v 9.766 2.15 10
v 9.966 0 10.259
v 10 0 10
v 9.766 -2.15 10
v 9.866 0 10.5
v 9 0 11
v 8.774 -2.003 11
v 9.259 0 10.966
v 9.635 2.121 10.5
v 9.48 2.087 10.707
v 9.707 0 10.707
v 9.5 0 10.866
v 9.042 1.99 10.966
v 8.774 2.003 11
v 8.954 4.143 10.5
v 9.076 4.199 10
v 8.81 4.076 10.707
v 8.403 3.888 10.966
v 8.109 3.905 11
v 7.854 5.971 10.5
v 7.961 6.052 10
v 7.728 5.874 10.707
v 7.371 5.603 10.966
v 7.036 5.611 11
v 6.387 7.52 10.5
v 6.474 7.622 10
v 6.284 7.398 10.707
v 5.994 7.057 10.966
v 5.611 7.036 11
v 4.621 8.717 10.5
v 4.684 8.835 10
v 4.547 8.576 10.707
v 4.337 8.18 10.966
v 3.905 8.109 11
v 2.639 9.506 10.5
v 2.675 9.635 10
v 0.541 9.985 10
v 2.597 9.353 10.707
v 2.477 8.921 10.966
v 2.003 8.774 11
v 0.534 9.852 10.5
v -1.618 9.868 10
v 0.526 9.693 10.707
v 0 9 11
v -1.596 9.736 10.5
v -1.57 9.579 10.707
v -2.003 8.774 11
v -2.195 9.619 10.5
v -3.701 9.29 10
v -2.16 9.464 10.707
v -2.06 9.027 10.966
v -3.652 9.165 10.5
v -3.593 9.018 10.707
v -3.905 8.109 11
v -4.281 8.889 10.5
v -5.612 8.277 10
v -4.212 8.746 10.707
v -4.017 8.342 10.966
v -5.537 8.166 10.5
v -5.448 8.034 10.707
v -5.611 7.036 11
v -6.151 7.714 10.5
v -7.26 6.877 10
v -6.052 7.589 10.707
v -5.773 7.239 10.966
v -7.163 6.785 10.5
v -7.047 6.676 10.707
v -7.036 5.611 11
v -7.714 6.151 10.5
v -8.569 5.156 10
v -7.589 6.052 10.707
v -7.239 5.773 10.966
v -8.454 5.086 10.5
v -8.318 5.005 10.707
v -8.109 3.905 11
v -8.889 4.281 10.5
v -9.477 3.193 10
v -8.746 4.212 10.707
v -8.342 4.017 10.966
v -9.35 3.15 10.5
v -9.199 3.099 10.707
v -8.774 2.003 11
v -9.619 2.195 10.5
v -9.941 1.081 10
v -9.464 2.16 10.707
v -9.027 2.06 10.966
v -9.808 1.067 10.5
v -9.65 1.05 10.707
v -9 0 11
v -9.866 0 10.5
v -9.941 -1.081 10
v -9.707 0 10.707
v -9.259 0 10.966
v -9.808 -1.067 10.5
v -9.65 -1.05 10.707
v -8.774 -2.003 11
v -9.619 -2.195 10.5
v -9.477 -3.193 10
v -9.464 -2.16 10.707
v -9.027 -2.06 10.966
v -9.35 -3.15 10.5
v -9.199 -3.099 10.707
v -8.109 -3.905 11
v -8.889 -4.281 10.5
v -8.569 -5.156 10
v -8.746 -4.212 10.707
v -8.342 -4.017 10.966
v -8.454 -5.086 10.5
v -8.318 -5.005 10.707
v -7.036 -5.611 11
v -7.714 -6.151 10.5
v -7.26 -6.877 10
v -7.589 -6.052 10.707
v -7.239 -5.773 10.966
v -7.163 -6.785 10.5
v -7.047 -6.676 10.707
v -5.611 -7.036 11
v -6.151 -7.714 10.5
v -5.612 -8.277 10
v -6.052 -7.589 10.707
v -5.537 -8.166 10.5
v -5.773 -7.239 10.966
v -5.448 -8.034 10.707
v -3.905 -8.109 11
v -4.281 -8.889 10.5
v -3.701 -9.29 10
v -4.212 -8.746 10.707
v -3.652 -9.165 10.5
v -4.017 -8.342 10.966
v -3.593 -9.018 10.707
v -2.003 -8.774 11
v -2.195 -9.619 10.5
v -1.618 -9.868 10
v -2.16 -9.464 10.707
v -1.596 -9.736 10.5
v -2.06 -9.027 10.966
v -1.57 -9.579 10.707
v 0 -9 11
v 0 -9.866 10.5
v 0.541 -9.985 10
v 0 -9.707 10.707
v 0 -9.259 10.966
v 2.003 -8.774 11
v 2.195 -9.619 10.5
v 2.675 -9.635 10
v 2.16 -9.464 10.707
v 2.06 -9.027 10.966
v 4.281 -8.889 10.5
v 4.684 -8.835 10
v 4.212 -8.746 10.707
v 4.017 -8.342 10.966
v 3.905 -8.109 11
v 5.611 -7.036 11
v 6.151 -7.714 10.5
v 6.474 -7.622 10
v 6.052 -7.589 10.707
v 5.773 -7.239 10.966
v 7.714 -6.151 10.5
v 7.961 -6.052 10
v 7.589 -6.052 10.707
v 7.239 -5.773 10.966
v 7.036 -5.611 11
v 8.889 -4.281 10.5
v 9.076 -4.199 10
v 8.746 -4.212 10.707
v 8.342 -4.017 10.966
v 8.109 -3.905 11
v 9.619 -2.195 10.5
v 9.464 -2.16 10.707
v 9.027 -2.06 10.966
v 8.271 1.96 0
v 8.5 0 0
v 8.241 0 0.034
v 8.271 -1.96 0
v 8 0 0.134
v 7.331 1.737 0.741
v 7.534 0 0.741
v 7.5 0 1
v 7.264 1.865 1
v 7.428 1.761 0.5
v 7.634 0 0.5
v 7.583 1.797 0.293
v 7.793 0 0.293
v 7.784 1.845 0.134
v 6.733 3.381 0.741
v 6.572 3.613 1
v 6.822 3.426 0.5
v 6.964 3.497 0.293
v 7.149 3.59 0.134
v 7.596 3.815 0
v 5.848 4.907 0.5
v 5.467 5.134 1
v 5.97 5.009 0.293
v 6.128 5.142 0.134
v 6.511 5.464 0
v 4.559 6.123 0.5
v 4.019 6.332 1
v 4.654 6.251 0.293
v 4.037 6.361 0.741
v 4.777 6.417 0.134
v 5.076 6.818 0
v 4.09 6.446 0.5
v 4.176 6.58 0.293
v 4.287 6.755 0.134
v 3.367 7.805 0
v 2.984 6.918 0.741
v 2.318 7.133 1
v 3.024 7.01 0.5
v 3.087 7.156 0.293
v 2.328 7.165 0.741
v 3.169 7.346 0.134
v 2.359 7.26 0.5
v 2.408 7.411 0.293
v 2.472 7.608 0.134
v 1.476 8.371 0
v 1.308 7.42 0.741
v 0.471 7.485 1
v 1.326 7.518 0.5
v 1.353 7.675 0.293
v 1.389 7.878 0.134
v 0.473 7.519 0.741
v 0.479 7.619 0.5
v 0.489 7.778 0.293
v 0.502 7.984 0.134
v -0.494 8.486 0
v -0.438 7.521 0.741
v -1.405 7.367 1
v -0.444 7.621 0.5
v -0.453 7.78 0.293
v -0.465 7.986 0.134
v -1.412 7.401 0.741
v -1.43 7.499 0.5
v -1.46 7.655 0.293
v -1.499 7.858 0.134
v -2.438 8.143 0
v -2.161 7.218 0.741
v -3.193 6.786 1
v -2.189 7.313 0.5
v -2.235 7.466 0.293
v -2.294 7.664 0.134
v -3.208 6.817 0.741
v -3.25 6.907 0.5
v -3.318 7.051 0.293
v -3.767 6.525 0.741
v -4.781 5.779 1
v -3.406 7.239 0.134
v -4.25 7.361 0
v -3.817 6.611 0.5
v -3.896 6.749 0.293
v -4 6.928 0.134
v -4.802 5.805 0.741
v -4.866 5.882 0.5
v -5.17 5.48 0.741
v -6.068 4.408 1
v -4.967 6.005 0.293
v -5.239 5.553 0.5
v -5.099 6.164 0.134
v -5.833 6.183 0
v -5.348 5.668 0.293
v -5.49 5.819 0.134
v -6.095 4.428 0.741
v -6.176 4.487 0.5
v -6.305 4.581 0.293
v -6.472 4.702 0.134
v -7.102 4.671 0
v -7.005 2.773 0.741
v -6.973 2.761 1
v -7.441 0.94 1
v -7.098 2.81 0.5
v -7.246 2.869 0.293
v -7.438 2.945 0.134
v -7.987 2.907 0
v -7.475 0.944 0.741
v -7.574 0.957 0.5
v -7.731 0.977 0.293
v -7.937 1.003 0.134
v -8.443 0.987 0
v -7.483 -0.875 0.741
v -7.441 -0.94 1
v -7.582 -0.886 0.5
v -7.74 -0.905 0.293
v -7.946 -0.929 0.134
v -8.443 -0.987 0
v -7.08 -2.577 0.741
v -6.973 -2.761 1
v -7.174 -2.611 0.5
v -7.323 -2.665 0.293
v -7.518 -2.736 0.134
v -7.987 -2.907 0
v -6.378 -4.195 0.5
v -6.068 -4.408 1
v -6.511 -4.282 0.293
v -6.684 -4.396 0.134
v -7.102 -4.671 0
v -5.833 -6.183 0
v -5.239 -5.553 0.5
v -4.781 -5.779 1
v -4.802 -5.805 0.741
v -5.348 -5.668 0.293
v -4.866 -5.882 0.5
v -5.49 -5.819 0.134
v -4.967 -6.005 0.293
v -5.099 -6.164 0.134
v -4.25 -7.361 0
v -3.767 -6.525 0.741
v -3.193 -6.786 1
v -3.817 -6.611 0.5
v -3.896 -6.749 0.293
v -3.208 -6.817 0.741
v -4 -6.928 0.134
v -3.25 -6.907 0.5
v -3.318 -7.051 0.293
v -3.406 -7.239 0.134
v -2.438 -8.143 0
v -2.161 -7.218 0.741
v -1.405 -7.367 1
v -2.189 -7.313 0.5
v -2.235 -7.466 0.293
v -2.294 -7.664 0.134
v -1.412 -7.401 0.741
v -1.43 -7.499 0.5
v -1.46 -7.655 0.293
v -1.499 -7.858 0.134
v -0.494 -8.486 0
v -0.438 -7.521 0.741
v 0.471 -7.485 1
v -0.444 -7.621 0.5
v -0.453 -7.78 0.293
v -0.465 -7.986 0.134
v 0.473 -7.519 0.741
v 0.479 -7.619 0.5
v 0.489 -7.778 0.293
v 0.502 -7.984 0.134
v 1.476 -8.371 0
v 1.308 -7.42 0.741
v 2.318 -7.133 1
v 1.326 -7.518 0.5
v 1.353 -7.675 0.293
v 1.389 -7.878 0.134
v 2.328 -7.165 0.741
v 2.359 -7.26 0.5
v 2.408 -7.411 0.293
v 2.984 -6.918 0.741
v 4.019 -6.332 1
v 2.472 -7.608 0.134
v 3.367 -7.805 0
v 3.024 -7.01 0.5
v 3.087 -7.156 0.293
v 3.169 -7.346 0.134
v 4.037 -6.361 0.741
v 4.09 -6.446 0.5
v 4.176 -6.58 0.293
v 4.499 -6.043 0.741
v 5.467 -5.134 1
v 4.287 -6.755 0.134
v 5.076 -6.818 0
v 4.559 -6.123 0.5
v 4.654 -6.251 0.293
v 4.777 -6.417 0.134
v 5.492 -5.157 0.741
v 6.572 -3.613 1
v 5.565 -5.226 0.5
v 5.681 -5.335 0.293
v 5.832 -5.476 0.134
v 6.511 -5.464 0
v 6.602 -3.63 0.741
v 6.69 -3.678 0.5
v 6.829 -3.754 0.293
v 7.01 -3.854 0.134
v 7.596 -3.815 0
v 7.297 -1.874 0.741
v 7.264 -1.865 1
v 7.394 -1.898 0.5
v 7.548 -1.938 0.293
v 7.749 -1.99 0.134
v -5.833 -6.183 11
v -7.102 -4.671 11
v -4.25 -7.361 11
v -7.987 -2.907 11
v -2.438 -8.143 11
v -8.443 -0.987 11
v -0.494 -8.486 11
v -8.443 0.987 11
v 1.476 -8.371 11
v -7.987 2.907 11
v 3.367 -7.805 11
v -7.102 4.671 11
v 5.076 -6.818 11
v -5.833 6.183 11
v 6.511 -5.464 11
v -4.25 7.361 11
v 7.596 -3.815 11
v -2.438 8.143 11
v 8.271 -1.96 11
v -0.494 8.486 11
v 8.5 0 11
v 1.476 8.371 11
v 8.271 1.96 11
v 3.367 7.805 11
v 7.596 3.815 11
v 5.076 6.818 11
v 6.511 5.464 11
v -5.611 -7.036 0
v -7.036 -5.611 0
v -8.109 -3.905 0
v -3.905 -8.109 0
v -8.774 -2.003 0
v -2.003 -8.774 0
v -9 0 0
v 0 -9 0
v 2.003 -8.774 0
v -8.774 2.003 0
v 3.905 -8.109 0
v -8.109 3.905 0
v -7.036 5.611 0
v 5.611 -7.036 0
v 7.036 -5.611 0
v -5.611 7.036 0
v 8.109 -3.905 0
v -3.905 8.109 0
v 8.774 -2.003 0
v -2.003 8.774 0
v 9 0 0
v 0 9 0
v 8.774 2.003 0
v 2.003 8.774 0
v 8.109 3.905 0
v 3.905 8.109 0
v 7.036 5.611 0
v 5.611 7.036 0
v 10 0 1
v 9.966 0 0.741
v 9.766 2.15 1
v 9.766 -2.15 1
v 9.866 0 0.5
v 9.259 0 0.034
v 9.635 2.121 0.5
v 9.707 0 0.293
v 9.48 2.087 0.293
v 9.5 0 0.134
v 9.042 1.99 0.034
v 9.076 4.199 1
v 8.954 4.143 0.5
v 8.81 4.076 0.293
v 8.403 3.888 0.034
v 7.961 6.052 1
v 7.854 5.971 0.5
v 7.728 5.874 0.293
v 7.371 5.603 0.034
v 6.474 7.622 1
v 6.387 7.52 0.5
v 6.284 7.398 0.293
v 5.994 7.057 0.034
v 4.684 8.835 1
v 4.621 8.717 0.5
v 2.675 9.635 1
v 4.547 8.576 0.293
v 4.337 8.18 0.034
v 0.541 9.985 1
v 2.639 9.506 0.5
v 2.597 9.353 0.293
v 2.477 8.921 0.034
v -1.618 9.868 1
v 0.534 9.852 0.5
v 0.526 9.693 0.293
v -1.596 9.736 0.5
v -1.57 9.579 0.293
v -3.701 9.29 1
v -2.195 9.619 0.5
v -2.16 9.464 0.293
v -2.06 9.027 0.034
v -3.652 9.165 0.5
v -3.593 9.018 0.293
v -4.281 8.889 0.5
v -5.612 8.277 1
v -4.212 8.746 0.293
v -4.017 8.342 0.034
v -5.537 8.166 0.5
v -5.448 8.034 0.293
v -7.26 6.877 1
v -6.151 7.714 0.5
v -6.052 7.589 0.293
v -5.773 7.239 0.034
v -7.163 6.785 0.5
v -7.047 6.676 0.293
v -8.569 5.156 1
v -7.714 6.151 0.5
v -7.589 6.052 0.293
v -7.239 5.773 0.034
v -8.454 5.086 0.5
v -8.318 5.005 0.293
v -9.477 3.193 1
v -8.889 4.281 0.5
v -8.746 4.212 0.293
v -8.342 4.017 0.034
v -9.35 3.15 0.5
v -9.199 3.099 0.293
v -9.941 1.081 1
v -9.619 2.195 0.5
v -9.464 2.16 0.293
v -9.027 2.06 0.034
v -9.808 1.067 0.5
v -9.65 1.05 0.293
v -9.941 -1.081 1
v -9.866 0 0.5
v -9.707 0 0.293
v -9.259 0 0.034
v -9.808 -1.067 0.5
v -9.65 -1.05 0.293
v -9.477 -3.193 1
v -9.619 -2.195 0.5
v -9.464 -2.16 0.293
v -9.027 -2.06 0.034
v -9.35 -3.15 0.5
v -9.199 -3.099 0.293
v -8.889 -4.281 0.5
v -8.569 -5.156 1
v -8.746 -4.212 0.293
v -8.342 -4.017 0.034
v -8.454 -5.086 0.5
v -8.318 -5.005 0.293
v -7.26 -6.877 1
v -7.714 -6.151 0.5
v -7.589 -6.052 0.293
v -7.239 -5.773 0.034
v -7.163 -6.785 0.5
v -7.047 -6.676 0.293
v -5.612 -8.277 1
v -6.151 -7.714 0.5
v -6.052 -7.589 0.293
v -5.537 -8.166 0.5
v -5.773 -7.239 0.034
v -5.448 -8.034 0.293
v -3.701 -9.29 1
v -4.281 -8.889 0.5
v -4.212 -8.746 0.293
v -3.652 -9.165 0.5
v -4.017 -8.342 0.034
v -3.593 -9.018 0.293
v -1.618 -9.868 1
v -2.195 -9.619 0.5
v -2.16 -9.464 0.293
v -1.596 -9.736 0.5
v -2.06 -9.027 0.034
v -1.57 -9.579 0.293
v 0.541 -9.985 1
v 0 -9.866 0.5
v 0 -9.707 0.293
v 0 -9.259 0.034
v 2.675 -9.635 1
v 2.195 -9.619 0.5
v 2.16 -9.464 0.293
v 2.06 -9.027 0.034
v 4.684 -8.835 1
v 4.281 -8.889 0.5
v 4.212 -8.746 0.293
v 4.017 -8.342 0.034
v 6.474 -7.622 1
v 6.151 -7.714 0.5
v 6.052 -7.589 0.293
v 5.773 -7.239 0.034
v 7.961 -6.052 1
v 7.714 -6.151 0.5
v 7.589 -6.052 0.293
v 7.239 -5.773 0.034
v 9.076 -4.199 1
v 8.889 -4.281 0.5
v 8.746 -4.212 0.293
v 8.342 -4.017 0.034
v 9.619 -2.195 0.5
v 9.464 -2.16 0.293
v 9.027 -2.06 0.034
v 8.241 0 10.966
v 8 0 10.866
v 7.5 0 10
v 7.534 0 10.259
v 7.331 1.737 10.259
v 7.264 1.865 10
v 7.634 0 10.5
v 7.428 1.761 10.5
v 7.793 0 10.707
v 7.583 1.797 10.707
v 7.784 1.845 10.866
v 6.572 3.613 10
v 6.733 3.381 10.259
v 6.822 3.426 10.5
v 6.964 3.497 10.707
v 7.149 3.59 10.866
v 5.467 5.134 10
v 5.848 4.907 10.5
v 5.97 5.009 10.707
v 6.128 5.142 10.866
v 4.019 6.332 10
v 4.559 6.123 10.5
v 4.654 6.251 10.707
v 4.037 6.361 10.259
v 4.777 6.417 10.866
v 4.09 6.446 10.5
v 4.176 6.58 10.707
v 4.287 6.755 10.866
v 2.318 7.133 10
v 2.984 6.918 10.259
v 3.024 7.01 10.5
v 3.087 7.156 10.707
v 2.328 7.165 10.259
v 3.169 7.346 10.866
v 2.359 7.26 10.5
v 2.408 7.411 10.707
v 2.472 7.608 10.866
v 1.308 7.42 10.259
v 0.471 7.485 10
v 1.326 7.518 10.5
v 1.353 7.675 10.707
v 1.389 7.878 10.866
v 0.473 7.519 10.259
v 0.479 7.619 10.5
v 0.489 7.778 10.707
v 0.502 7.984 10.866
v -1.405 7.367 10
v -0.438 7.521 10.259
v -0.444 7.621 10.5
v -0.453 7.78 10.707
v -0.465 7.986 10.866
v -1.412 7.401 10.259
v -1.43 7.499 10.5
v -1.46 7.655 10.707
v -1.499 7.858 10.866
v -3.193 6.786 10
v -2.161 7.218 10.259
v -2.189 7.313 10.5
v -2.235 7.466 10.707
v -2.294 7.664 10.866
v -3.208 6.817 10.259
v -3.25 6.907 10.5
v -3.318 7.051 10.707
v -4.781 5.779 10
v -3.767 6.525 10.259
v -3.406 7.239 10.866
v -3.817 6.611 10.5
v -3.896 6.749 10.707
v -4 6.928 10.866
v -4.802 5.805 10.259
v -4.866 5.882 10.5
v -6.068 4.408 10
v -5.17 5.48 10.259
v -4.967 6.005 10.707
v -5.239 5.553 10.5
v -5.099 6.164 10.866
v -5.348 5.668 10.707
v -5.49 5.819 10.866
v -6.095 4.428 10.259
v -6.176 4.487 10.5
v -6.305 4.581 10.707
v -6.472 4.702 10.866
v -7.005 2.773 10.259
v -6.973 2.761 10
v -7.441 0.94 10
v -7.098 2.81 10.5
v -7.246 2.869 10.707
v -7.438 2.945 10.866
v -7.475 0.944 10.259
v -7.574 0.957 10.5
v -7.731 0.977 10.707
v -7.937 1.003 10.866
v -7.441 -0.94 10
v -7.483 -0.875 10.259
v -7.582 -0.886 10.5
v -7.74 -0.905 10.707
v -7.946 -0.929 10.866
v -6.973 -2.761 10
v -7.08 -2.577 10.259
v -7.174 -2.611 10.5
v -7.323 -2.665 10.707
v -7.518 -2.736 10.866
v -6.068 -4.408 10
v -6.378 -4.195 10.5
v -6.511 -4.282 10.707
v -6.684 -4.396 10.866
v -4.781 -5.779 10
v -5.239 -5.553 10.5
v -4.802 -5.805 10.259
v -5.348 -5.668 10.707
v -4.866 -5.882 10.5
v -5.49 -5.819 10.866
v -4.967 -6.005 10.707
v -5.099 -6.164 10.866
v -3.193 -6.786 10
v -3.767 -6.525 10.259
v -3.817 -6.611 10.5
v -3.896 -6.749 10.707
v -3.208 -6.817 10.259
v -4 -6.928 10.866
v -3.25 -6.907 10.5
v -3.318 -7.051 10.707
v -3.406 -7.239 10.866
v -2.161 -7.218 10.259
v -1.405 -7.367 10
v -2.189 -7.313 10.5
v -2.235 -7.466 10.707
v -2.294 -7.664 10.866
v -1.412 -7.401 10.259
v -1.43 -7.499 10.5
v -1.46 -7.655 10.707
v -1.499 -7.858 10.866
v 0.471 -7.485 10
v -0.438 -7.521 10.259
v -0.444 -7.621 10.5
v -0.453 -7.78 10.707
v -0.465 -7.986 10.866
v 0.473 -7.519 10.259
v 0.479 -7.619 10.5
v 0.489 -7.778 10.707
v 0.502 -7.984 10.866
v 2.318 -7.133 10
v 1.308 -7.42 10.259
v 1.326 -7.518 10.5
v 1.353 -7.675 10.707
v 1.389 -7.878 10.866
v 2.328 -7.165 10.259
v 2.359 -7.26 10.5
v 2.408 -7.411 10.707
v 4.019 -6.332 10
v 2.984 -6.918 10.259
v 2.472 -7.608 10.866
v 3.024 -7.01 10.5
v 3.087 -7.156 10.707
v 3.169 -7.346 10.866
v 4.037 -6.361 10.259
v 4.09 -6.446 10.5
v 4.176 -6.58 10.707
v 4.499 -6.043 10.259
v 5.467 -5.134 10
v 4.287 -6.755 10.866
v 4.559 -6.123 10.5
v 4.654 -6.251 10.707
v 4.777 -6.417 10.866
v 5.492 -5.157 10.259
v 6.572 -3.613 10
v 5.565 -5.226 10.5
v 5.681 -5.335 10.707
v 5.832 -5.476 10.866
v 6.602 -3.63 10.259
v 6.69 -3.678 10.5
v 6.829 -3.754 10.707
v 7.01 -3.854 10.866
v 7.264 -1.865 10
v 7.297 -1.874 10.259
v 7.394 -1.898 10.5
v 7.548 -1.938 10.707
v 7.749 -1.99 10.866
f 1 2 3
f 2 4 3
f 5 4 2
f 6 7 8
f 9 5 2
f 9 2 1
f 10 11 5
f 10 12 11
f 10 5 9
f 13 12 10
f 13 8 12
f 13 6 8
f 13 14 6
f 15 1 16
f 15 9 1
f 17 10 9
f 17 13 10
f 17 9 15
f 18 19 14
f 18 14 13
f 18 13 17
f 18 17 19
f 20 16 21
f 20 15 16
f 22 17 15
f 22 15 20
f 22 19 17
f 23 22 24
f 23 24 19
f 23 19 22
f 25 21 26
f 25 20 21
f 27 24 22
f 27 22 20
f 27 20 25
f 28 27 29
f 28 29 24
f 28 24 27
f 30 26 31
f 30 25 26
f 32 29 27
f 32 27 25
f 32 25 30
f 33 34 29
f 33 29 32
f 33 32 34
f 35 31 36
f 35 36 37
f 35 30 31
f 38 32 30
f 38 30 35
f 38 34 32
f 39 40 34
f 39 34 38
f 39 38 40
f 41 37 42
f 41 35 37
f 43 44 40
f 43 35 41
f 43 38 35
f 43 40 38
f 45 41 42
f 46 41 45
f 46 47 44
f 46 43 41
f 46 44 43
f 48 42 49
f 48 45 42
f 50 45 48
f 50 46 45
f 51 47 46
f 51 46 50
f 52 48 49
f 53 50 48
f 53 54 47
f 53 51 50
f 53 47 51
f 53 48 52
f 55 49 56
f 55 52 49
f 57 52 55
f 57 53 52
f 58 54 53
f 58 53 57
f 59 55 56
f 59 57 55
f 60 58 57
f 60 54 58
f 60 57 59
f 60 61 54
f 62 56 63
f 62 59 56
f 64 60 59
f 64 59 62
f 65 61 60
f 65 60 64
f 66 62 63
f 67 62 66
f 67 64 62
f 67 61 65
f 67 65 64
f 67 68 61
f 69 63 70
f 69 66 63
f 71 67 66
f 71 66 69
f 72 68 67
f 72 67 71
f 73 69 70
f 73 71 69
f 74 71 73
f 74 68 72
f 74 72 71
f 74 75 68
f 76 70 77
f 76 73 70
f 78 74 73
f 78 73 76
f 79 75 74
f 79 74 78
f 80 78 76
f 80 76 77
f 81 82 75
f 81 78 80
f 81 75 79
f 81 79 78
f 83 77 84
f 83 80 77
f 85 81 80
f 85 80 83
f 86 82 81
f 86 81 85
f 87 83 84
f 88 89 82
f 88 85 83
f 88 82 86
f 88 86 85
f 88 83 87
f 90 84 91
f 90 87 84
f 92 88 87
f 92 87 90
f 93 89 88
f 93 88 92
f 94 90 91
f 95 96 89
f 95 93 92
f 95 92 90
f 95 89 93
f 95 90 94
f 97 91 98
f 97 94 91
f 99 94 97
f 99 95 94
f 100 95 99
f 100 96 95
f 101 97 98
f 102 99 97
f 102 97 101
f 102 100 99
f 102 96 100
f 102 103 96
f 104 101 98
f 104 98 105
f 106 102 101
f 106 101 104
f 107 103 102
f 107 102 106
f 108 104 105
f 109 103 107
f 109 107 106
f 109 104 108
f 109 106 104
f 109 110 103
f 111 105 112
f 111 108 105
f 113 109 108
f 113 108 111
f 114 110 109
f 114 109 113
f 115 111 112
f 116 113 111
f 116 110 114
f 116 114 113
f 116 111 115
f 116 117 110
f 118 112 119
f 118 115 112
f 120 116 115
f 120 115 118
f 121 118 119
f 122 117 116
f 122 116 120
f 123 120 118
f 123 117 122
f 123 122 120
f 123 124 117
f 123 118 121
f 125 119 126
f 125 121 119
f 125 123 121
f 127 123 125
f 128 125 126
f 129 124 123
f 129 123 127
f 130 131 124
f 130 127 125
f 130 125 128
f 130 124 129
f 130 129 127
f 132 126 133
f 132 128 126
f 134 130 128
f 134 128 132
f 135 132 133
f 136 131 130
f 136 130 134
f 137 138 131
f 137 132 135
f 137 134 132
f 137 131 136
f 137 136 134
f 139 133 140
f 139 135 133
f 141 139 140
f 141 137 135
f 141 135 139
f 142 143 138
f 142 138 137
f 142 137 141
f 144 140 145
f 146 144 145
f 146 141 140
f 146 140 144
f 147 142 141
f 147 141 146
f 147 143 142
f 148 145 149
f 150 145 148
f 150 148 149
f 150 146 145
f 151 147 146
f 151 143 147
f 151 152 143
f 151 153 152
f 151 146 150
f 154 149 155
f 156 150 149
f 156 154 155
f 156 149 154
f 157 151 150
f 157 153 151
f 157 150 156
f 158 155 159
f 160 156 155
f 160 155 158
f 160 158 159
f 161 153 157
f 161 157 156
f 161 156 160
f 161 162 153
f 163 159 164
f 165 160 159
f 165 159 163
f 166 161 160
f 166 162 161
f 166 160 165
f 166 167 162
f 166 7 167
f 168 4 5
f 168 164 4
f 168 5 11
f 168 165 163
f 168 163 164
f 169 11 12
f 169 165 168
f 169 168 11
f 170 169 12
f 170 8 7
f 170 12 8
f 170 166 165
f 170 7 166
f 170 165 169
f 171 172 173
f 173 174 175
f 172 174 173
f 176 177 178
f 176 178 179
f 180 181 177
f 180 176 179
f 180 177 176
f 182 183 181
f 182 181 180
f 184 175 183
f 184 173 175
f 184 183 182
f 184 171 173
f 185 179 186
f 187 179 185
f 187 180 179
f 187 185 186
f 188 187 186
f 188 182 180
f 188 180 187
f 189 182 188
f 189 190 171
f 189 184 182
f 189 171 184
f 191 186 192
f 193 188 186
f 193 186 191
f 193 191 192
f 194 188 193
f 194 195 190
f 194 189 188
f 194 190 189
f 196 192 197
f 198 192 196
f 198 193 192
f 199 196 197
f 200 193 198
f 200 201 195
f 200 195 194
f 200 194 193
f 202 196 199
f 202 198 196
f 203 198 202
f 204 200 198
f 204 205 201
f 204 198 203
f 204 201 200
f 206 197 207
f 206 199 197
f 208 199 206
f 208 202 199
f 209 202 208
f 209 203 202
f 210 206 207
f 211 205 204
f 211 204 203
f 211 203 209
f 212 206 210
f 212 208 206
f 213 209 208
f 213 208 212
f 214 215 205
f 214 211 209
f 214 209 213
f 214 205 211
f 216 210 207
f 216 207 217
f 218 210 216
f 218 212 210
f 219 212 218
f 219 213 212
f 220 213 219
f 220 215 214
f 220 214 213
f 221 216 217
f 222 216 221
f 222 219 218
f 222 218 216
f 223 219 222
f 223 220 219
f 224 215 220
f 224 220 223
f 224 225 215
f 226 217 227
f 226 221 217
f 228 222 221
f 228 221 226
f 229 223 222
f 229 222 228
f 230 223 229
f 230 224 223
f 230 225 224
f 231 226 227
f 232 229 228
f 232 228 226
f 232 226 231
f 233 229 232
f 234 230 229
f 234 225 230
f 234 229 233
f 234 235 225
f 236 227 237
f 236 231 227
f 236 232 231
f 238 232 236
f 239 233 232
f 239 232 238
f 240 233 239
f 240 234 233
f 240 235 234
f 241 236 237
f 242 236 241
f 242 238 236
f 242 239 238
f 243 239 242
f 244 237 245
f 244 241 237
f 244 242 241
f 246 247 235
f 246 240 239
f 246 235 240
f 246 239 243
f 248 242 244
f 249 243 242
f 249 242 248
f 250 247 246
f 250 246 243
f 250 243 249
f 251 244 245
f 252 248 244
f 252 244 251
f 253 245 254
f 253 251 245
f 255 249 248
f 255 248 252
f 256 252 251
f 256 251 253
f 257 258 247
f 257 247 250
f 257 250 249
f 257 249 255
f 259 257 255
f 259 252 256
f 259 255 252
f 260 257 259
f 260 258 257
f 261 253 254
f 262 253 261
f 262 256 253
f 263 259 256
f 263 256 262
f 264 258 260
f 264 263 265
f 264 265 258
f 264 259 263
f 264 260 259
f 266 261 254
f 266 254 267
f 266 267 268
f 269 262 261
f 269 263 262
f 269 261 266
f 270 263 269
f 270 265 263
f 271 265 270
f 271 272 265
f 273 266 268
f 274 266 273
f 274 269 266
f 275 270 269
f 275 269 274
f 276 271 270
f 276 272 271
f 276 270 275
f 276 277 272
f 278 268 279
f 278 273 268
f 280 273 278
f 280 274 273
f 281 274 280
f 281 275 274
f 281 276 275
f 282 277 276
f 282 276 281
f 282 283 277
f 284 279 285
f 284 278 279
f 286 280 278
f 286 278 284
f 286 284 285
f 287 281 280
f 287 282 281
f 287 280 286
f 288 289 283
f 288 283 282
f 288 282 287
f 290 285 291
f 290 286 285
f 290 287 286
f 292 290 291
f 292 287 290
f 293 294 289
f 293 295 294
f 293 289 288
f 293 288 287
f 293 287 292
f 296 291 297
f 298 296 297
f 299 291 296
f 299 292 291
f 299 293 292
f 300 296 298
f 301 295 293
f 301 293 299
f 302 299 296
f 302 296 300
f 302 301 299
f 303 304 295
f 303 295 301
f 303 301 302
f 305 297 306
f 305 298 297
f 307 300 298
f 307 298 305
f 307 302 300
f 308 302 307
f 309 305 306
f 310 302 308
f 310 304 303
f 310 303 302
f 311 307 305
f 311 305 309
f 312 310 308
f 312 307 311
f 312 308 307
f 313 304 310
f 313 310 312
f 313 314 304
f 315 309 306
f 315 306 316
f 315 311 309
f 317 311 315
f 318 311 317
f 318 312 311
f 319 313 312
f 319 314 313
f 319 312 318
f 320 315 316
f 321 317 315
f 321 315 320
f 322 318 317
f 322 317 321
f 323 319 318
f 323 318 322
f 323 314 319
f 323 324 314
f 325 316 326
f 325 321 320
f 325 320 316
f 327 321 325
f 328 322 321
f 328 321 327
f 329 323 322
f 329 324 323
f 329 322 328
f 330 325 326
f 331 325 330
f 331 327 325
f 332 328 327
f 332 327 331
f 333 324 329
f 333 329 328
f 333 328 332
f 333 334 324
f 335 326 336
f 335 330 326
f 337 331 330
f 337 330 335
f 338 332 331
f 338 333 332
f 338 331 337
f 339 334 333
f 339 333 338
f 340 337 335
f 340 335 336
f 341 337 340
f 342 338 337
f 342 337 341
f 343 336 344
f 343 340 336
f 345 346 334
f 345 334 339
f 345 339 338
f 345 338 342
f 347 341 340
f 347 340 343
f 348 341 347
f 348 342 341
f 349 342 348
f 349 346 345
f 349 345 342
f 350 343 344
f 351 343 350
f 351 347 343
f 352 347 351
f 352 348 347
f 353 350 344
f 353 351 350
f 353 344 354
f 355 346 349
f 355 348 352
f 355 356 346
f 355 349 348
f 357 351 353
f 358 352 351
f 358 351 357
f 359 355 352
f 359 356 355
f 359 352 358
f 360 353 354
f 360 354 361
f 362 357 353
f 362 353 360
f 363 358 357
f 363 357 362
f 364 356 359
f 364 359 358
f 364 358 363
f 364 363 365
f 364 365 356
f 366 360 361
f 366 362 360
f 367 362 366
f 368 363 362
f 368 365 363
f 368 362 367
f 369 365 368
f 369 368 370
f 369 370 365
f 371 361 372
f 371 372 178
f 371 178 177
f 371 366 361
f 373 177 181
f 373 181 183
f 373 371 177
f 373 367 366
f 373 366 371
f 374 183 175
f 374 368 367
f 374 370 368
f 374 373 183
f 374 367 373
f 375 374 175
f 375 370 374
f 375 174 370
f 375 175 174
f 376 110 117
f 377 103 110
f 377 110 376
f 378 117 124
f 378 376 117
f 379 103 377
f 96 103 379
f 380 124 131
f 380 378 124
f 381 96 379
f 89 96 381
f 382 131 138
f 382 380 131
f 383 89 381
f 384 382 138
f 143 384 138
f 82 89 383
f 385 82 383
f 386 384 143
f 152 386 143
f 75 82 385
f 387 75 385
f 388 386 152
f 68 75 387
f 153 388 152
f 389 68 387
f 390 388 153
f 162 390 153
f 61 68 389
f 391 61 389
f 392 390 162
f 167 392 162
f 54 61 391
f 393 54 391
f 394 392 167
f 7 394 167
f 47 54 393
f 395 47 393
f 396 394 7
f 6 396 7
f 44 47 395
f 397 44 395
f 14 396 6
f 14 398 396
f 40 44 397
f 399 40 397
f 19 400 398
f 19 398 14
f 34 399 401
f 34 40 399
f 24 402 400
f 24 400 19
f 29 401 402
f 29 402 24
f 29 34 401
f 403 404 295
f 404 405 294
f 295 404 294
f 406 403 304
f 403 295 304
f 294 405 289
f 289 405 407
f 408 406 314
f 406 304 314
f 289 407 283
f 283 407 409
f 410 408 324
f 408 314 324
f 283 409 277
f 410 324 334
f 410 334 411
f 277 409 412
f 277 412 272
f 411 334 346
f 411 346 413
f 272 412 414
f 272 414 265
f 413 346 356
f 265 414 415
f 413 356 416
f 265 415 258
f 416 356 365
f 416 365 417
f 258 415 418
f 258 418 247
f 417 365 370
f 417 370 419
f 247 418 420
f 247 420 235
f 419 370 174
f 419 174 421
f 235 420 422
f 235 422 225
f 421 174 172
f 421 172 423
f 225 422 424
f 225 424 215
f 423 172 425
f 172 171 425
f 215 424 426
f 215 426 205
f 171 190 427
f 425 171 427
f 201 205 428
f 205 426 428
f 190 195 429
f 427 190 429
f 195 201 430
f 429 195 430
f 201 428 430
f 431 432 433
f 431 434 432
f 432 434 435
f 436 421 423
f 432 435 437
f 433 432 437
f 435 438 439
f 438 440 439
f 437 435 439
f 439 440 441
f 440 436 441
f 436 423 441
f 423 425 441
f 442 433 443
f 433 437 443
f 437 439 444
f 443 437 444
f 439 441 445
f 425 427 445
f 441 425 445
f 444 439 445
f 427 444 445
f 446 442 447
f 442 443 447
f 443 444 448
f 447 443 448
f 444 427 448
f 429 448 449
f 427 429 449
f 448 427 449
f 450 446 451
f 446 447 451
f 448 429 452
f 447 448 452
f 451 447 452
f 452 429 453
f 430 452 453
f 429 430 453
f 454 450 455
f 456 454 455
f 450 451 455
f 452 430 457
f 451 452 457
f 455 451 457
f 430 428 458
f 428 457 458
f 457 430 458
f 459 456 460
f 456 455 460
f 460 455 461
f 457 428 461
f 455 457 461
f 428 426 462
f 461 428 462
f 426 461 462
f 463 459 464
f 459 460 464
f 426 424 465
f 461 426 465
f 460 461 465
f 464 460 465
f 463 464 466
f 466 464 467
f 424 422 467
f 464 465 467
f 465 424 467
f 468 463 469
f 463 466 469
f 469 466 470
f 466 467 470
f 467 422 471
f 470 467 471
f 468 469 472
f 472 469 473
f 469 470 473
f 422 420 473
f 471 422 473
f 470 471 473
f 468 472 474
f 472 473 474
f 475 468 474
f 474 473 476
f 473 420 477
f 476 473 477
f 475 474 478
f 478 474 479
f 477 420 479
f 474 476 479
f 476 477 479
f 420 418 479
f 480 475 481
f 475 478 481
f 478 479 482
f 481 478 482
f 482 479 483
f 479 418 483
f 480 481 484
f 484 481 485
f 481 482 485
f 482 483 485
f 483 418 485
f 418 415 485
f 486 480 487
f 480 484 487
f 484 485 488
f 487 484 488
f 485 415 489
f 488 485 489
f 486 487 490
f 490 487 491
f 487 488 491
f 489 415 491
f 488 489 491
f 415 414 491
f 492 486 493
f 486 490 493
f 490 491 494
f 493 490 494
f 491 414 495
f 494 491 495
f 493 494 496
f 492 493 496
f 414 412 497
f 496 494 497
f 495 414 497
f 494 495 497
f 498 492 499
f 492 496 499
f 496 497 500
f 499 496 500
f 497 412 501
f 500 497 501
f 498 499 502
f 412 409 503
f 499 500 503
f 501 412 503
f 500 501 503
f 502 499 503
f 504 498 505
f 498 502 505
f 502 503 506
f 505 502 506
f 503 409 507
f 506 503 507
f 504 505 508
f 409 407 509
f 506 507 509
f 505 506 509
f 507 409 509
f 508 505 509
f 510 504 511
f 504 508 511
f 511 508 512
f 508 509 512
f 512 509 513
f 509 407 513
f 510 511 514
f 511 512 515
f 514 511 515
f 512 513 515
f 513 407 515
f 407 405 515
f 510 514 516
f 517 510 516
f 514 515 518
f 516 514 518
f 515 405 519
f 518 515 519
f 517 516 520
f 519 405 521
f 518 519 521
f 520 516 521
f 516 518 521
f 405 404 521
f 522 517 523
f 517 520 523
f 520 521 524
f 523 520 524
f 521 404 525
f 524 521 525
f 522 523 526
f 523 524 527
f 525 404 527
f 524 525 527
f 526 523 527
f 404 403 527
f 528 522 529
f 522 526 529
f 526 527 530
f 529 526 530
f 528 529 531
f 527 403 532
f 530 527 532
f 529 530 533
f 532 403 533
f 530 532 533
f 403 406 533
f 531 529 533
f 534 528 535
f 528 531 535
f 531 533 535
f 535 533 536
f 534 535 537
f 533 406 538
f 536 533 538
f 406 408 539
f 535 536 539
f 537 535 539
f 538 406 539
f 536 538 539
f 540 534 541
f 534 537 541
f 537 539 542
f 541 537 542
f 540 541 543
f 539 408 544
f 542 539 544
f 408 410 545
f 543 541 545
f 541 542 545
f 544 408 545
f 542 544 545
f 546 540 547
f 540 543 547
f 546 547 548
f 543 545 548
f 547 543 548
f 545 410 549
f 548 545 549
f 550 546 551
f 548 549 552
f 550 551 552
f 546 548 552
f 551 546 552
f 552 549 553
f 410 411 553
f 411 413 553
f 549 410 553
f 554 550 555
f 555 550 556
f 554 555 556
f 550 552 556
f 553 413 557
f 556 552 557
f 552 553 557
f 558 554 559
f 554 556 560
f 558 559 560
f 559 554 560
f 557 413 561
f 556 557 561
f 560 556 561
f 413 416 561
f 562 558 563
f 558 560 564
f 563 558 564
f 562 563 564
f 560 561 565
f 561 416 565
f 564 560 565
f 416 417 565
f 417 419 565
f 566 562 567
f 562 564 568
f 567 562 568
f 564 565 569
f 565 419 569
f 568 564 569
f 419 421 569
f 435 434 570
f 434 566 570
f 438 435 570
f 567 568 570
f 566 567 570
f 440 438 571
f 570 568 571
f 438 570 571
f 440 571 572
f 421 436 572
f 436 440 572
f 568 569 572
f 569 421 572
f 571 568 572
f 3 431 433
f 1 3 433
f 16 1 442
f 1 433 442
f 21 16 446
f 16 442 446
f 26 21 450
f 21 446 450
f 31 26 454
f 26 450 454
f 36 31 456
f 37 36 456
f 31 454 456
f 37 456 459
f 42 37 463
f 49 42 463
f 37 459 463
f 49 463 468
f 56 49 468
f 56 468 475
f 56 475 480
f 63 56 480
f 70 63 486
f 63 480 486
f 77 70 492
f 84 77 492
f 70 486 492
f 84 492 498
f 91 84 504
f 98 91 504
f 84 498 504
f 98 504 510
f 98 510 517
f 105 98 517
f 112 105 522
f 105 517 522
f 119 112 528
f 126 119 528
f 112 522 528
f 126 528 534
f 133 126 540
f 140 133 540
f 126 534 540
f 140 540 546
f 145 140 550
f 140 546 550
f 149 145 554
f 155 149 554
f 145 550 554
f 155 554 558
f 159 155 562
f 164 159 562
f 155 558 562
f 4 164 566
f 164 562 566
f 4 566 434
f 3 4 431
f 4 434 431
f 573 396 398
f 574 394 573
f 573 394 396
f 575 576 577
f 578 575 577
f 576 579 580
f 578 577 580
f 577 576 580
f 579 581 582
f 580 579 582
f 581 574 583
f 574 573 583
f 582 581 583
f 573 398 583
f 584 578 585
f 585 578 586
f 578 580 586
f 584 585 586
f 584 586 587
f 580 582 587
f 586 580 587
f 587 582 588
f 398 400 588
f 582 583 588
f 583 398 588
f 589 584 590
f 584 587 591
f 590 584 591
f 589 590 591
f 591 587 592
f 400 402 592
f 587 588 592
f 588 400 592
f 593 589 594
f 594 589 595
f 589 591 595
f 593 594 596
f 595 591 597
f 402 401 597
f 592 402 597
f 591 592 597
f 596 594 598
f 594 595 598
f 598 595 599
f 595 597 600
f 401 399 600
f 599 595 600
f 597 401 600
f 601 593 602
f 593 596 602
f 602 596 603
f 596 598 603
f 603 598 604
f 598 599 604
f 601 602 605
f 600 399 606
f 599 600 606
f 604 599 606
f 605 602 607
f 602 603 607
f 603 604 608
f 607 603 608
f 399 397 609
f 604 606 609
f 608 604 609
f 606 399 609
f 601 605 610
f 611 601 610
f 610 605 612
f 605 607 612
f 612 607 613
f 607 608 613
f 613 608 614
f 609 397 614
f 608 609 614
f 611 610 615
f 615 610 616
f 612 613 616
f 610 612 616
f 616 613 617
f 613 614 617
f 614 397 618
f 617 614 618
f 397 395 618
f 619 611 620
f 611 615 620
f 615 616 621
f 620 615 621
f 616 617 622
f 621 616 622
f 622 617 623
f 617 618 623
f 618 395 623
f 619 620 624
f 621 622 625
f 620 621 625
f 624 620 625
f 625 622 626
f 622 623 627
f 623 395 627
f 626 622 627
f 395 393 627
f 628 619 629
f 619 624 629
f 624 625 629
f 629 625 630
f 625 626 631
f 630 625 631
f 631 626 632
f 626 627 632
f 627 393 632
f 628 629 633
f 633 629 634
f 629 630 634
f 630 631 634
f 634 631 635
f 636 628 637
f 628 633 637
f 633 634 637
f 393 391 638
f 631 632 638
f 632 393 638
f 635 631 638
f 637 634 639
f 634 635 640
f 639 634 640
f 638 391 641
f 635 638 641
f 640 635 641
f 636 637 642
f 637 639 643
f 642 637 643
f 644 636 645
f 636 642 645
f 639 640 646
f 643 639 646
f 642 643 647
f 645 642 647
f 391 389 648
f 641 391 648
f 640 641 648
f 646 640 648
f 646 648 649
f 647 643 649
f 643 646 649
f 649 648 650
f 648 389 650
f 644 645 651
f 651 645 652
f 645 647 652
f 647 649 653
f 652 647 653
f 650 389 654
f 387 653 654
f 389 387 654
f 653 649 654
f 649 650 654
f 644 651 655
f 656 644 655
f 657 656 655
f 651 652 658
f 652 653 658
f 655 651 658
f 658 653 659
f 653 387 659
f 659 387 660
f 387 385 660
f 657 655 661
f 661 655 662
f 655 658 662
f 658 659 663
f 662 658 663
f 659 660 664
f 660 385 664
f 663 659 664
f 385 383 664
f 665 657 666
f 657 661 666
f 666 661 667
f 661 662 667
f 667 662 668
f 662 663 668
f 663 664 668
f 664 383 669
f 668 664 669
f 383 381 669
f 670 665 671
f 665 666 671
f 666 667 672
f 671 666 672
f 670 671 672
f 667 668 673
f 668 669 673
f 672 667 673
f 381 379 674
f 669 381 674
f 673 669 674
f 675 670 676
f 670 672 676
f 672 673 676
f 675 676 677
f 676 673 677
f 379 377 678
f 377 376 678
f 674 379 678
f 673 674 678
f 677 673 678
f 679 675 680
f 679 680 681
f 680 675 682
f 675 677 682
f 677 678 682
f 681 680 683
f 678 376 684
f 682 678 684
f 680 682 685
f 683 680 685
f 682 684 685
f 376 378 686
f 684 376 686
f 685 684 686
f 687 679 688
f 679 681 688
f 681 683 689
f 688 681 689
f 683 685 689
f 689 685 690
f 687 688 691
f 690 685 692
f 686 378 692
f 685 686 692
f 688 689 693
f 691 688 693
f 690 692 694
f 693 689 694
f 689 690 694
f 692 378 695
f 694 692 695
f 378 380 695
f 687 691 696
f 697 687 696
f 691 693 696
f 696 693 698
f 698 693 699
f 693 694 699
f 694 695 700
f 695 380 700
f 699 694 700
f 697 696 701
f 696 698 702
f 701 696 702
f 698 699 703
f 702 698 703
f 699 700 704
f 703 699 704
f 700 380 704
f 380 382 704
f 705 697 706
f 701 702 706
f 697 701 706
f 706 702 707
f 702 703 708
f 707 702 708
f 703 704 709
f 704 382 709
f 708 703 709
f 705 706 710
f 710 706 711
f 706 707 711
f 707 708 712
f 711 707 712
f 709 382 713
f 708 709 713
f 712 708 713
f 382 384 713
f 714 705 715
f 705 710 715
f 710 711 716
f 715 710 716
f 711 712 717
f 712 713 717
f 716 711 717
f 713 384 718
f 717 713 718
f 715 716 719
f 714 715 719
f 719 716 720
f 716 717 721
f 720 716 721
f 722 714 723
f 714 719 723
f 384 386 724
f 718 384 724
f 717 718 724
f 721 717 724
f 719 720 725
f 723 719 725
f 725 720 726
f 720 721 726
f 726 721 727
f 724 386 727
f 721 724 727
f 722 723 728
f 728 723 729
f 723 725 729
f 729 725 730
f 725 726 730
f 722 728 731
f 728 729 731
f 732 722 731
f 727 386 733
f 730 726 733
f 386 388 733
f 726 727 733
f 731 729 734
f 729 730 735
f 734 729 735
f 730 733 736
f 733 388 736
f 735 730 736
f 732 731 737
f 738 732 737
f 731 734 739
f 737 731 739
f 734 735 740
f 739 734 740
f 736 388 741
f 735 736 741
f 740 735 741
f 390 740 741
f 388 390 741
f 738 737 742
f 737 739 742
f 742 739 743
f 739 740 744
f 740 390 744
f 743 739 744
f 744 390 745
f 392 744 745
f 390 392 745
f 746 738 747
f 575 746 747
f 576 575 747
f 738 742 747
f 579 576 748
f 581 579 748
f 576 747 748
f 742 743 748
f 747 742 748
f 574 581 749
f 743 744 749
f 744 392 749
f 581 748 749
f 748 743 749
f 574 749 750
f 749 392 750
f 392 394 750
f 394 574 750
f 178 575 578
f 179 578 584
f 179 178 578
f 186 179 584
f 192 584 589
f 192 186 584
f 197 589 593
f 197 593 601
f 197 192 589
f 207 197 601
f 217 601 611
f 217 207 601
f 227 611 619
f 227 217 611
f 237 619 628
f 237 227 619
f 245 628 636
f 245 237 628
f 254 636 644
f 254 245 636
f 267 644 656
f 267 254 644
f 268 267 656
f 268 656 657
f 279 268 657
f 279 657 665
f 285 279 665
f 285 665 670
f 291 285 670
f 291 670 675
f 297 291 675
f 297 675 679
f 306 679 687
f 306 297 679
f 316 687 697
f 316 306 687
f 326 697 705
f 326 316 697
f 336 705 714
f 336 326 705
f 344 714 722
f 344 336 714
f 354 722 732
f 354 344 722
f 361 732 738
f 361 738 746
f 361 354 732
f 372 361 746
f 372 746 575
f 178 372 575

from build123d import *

# Parameters (mm, degrees)
F0_R     = 10
F0_R_2   = 7.5
F1_DEPTH = 11
F2_R     = 1


with BuildPart() as f1:
    # F0 (on Top) → F1 (new body)
    with BuildSketch(Plane.XY):
        Circle(F0_R)
        Circle(F0_R_2, mode=Mode.SUBTRACT)
    extrude(amount=F1_DEPTH)

    # F2
    f2_edges = [f1.edges().sort_by_distance(p)[0] for p in [
        (7.5, 0, 5.5),
        (-7.5, 0, 0),
        (-7.5, 0, 11),
        (-10, 0, 11),
        (-10, 0, 0),
    ]]
    fillet(f2_edges, radius=F2_R)


solid = f1.part
